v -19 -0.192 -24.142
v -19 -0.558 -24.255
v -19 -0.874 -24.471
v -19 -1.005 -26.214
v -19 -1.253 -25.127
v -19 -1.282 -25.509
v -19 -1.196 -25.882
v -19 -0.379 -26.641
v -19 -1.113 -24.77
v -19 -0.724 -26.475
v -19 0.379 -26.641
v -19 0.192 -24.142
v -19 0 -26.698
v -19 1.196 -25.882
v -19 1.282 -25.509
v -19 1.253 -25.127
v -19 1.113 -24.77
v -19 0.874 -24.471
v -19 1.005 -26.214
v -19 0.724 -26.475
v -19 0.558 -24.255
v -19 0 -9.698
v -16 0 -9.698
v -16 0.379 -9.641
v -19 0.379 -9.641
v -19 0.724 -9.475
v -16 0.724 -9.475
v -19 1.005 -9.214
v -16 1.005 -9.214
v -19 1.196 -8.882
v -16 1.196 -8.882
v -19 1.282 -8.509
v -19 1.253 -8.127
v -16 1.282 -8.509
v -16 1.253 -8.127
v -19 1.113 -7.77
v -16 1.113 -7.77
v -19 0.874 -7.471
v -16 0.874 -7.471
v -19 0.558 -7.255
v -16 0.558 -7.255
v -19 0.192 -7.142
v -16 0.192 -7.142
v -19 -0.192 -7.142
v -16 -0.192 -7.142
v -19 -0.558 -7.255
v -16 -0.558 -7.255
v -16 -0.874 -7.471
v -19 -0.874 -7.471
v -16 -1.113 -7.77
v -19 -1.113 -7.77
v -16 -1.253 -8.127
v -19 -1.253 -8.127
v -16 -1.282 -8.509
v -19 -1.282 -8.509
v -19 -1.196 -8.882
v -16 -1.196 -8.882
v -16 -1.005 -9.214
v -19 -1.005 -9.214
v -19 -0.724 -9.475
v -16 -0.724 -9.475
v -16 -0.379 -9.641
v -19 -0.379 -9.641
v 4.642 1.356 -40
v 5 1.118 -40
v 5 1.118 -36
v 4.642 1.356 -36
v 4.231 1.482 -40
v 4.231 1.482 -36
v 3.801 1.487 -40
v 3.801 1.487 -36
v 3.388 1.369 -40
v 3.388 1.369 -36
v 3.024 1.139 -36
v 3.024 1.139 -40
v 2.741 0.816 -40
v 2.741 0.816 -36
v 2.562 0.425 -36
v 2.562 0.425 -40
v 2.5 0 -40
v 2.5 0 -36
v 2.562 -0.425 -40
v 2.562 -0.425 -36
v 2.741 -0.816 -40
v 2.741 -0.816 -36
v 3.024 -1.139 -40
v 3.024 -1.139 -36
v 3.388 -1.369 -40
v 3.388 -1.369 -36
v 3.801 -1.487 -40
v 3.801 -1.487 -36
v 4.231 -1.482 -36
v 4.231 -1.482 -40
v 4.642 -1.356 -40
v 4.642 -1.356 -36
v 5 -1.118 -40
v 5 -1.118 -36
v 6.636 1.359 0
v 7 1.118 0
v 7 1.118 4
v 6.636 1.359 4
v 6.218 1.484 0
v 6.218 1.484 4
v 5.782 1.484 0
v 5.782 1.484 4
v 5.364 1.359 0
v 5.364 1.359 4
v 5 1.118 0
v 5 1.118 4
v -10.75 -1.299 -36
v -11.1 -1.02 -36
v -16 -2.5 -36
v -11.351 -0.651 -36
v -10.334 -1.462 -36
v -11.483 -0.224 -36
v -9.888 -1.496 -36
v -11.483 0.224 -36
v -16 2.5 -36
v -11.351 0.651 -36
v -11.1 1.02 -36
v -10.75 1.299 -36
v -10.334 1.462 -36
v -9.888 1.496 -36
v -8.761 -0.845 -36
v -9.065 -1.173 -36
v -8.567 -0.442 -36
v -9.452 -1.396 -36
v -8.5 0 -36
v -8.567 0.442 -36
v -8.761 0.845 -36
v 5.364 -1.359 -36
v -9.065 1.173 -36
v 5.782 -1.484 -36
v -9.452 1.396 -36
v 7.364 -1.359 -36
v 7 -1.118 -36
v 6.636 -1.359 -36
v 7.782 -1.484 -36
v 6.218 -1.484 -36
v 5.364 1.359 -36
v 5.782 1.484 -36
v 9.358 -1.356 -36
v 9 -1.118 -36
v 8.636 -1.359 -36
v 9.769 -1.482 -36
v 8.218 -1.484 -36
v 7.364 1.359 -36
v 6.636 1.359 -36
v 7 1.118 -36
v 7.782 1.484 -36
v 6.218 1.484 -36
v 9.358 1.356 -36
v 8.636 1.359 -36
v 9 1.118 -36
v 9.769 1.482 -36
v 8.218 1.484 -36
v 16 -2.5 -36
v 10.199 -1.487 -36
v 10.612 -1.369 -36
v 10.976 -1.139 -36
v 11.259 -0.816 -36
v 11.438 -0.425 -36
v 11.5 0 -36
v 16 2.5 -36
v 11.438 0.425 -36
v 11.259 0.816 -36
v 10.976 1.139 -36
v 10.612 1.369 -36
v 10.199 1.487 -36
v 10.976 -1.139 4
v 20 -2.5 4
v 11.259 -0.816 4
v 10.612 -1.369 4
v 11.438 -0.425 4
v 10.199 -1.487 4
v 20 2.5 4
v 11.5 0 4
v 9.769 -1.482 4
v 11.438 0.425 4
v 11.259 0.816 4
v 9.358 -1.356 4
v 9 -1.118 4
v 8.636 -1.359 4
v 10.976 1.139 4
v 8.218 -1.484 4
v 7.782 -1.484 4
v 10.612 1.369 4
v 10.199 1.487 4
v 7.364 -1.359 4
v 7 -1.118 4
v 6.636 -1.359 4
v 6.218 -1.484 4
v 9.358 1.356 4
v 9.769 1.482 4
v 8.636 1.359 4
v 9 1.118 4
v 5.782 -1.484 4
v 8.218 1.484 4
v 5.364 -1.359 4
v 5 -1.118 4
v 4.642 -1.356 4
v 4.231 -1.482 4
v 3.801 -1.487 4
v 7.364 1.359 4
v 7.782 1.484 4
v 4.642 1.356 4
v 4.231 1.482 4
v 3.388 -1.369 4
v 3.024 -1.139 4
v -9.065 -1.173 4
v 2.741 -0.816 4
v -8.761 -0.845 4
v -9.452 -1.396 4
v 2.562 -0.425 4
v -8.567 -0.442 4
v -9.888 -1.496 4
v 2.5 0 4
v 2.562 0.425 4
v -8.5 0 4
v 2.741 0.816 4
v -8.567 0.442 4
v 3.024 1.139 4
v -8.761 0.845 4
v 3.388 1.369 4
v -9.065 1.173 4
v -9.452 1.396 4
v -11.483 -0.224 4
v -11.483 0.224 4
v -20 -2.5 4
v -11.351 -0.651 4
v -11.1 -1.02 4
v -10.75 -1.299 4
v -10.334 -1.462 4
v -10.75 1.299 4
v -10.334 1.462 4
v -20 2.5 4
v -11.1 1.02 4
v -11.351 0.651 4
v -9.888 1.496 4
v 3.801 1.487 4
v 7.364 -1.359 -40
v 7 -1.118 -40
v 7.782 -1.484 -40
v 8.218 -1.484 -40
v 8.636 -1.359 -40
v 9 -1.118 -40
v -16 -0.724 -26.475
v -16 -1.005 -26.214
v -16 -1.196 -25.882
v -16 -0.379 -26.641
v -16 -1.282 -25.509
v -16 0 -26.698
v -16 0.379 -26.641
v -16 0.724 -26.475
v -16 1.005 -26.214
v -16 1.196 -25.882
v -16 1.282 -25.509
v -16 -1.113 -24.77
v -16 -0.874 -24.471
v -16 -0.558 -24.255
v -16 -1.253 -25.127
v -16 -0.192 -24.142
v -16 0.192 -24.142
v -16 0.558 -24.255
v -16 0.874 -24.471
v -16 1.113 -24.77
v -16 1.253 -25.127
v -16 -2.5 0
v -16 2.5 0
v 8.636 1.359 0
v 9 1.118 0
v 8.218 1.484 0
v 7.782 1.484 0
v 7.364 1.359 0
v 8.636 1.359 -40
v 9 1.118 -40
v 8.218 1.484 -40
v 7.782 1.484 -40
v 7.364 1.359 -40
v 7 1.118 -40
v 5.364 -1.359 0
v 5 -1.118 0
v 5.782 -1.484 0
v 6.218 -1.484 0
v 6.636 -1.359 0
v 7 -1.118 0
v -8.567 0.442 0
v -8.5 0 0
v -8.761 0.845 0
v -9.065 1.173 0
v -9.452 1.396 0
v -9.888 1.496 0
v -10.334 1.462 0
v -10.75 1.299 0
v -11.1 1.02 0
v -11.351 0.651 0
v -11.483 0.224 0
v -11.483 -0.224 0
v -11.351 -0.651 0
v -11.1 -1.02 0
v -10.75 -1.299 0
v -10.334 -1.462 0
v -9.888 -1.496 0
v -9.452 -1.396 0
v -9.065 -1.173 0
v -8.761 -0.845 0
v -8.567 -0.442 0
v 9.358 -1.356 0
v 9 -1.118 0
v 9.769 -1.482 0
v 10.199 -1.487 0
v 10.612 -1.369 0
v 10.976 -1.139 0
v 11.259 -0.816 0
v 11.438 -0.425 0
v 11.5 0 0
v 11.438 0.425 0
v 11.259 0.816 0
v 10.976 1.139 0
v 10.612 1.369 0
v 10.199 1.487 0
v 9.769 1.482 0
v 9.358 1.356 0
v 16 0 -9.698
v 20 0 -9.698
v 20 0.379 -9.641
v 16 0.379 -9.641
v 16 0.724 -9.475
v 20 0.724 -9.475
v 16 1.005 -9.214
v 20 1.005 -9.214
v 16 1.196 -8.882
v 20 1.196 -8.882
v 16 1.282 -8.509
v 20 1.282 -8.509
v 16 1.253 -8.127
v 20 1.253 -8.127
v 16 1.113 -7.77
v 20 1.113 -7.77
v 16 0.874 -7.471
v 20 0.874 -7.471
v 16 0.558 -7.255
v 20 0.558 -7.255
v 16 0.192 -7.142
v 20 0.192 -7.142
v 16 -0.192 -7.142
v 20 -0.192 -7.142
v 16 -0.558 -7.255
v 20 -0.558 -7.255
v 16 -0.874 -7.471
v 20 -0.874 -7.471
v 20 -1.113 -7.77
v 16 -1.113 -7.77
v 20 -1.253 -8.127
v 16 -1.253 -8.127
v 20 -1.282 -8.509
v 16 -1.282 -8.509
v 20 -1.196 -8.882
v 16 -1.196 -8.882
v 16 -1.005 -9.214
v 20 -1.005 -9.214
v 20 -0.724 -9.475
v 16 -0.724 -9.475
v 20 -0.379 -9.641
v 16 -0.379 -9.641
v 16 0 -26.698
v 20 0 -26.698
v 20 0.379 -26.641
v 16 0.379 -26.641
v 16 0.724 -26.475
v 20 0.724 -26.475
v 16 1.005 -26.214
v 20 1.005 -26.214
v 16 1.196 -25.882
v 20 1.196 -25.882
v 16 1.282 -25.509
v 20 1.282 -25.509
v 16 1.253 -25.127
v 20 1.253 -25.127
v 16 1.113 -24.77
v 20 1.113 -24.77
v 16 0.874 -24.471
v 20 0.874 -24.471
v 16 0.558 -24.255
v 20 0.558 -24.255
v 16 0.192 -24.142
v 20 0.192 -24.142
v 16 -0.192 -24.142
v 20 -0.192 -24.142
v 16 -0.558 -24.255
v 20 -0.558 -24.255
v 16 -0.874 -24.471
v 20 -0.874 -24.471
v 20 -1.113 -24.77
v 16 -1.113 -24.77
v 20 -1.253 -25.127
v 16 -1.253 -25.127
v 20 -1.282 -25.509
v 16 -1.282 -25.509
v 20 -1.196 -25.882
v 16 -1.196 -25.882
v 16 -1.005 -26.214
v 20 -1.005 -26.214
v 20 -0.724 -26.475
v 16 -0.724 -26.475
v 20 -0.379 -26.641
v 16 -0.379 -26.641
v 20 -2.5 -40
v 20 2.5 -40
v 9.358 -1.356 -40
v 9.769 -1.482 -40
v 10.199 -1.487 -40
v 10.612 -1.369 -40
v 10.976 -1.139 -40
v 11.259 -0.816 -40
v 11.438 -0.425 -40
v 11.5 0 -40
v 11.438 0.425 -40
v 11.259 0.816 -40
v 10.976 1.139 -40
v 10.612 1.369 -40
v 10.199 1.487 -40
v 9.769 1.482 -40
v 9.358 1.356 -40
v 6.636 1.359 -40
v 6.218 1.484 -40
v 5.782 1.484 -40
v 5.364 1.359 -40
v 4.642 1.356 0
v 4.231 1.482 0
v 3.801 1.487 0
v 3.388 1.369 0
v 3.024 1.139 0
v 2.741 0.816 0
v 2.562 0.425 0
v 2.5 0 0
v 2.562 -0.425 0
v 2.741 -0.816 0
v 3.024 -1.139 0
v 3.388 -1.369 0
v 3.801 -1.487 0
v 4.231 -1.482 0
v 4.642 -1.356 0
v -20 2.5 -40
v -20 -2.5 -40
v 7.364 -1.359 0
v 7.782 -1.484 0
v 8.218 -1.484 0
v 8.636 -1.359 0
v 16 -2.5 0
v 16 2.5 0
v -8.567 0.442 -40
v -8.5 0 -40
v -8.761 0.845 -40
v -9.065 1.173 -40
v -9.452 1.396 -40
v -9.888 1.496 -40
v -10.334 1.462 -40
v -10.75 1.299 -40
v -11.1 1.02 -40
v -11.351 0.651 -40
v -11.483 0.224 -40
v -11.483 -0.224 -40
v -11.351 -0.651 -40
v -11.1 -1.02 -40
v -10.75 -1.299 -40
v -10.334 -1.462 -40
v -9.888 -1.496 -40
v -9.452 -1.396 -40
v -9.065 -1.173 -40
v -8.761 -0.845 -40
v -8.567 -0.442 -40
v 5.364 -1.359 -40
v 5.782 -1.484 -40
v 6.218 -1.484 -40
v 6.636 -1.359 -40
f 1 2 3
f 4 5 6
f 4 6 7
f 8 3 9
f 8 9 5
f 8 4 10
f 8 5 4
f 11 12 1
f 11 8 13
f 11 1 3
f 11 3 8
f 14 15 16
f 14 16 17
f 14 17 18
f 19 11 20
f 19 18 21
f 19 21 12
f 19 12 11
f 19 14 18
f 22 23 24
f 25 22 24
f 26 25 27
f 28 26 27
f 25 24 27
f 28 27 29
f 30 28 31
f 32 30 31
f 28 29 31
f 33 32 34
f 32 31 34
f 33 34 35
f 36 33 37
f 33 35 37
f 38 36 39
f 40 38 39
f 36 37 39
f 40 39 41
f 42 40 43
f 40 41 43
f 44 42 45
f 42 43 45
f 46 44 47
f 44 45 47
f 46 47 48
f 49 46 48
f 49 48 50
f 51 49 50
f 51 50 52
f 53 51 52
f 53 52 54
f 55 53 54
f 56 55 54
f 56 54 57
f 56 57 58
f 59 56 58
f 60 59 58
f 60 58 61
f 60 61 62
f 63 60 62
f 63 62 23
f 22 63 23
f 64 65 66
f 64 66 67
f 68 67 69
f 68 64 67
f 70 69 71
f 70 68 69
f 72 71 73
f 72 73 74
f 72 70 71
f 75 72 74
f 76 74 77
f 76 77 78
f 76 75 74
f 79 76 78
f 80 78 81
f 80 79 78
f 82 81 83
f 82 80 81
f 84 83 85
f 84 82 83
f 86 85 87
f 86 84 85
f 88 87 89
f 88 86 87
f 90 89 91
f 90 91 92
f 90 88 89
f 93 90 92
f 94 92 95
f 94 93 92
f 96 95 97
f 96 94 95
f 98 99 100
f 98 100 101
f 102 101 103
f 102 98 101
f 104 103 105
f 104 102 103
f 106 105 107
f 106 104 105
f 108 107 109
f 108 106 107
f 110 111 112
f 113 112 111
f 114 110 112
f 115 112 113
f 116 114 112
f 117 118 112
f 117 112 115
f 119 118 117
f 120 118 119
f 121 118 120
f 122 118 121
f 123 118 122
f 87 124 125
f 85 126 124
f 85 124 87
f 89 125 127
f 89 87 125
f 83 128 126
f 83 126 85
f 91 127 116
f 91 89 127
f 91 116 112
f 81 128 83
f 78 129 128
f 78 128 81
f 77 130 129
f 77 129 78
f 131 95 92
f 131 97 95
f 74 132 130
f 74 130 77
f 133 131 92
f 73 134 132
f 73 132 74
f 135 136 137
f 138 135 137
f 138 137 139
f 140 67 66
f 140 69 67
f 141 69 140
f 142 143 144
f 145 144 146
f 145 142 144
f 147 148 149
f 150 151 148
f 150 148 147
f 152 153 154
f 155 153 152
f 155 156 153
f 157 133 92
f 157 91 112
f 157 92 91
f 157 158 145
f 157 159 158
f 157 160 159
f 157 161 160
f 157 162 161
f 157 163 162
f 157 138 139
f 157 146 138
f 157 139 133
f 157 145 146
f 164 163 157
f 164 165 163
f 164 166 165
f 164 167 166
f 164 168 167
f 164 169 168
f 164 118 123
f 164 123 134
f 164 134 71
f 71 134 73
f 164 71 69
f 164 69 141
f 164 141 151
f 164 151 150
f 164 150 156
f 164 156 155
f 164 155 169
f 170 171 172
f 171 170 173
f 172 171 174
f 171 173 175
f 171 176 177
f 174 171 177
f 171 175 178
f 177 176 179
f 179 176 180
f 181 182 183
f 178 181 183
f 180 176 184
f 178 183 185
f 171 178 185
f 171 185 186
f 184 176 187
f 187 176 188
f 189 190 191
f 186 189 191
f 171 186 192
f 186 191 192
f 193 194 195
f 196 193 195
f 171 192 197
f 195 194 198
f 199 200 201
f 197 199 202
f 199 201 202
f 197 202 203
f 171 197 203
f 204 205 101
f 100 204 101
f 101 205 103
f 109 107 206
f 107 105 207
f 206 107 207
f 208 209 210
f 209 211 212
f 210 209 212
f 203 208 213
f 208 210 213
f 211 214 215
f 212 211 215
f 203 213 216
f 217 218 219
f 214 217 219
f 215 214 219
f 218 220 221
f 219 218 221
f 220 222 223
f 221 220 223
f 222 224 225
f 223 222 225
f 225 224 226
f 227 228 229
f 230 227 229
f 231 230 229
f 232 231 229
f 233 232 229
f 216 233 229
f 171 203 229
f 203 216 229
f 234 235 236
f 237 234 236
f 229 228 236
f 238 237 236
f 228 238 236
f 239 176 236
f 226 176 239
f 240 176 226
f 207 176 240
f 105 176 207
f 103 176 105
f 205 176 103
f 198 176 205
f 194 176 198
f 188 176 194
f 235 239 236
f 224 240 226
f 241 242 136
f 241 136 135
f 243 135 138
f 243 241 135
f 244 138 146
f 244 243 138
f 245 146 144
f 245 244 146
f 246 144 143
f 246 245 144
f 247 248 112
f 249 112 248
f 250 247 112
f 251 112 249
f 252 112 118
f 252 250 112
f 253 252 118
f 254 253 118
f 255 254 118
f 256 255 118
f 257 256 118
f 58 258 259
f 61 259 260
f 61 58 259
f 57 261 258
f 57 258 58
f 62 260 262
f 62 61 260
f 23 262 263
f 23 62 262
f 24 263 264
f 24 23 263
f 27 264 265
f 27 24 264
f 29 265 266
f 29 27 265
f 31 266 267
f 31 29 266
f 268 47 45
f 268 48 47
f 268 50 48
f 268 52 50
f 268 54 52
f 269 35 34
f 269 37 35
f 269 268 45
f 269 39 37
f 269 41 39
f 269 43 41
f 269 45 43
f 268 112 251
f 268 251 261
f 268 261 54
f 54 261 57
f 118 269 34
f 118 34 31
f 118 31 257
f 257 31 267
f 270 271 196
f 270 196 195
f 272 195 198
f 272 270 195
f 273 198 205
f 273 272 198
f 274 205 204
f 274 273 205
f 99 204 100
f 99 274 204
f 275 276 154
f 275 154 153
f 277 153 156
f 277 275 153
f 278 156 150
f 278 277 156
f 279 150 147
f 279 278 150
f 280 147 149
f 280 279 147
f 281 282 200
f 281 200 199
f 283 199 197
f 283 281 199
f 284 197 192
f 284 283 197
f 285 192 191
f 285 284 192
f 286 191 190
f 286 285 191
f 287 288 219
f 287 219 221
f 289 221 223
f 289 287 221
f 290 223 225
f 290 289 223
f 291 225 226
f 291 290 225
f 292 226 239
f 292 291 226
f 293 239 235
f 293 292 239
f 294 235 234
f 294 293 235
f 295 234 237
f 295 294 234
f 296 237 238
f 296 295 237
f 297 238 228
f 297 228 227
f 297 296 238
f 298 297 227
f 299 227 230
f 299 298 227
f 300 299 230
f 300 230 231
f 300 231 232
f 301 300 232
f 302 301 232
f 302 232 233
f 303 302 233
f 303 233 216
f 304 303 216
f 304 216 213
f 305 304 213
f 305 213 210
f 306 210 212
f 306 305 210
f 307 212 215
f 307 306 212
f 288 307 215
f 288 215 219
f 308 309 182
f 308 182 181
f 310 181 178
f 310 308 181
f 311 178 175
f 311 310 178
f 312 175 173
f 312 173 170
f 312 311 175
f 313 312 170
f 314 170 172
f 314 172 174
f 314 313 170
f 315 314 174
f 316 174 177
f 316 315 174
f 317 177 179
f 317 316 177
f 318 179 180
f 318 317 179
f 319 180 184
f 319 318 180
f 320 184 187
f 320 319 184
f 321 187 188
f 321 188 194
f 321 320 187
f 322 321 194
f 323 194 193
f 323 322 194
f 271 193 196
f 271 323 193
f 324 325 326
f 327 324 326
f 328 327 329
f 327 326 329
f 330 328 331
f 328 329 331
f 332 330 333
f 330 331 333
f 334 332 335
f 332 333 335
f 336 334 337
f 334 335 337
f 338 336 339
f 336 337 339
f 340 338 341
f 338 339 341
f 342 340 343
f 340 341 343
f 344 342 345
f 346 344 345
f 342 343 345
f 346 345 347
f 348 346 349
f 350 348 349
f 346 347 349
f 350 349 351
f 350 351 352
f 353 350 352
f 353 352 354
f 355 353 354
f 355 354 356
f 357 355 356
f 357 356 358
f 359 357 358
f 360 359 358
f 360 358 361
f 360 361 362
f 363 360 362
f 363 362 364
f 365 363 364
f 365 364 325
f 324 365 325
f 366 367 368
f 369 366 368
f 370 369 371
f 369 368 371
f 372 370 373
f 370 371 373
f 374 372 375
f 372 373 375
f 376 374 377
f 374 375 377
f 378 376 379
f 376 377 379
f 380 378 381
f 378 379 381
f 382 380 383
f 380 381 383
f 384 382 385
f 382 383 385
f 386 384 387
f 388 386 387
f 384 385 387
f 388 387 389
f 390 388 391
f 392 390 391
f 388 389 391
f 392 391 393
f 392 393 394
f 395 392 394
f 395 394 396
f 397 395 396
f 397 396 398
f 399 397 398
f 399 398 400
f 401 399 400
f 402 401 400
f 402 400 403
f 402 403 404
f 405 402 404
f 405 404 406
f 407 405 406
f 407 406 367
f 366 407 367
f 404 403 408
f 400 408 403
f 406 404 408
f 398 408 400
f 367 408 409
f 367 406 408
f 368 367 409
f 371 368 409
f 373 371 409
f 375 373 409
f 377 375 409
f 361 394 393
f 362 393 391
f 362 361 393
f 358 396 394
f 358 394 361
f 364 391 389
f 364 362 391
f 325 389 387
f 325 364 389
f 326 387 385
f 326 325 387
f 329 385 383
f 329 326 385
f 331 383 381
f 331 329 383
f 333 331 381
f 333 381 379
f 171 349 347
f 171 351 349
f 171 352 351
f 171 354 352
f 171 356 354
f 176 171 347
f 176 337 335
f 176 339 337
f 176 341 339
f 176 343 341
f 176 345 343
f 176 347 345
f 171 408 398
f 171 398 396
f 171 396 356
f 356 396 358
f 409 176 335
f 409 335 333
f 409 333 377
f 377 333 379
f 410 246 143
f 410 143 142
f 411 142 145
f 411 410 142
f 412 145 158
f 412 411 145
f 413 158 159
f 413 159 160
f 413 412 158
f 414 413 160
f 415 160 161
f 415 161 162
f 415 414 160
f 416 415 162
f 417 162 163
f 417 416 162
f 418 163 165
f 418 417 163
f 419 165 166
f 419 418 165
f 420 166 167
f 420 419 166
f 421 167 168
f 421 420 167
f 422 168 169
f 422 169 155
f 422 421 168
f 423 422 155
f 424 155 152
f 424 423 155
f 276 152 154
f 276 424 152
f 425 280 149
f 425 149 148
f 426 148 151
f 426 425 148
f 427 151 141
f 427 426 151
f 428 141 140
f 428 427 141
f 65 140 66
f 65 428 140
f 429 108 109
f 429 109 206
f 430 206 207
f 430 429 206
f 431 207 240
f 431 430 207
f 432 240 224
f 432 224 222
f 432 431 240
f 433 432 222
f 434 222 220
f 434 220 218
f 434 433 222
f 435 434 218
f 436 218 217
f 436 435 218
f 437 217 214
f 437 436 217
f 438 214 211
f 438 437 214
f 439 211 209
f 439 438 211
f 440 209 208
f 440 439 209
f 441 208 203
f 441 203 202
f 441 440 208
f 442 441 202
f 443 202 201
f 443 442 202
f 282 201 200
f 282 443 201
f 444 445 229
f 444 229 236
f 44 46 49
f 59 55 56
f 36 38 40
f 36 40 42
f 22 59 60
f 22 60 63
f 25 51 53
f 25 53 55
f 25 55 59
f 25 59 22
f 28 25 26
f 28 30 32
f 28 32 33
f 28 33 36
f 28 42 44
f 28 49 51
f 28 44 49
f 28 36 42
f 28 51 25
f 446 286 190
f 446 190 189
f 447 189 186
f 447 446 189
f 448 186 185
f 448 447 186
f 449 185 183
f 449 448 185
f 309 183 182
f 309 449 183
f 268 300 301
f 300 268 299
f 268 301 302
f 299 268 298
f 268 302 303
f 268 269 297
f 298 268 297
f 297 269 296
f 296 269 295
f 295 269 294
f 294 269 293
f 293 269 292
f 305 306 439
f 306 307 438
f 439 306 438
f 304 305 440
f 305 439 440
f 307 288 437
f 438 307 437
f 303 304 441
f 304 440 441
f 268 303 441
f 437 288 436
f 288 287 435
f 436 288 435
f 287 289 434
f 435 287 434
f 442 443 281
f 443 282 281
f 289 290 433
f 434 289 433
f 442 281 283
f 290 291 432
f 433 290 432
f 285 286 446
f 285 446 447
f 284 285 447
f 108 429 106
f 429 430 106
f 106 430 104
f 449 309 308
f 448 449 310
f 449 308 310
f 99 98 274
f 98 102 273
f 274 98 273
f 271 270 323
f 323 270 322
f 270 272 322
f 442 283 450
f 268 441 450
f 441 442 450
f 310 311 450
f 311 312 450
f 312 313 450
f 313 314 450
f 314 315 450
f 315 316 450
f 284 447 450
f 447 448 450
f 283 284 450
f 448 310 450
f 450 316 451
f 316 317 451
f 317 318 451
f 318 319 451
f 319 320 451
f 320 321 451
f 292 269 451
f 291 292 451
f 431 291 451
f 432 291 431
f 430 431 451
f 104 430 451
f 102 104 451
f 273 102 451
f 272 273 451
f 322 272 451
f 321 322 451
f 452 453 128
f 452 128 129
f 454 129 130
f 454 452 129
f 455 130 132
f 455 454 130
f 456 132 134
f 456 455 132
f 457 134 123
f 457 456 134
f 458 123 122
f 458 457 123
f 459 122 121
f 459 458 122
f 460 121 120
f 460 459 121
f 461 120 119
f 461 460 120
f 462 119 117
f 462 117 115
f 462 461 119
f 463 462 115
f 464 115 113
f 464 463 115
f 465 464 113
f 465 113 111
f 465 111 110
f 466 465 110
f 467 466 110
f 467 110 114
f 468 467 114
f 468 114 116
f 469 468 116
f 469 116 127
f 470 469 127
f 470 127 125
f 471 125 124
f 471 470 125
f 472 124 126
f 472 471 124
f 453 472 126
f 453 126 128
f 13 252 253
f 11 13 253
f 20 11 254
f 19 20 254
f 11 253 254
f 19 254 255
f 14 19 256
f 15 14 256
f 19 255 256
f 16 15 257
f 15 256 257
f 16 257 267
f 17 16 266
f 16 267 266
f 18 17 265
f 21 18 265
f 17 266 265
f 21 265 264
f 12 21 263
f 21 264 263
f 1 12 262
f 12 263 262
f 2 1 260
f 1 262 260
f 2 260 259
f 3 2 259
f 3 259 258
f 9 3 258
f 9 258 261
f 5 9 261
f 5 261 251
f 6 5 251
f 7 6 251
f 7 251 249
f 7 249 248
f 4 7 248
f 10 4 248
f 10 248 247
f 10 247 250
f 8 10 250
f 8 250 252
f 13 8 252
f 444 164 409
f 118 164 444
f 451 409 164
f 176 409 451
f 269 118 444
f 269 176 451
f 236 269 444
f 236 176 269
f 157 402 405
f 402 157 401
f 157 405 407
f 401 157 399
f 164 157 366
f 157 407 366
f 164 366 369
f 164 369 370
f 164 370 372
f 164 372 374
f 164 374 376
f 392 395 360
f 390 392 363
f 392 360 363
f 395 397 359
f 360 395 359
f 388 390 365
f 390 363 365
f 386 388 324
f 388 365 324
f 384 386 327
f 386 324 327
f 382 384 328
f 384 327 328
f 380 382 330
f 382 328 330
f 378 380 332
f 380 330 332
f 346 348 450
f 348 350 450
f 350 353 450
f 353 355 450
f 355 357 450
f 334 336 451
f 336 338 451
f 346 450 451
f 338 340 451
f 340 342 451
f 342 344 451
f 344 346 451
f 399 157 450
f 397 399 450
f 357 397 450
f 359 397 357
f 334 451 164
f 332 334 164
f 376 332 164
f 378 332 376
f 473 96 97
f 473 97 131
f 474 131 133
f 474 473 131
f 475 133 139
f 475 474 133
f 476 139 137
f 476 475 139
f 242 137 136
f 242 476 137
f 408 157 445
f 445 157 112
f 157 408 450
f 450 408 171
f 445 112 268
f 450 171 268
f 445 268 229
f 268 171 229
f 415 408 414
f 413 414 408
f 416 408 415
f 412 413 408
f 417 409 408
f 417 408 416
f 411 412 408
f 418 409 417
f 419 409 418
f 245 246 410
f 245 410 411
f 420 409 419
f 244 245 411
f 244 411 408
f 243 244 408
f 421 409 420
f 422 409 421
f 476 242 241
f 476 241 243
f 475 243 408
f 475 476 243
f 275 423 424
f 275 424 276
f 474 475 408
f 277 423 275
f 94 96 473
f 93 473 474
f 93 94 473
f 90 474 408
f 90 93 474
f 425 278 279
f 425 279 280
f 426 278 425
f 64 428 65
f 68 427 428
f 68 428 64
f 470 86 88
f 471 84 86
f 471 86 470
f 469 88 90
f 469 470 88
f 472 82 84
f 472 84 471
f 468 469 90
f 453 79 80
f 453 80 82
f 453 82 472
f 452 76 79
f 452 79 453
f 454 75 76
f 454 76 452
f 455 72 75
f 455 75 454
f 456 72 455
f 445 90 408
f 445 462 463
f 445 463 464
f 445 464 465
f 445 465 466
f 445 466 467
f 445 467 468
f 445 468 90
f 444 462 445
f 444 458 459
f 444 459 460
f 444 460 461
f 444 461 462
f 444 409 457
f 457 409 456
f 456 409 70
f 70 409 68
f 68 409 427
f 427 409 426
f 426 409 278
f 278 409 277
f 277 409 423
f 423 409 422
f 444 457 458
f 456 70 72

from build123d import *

# Parameters (mm, degrees)
ESBO_O1_W                = 32
ESBO_O1_H                = 5
ESBO_O1_R                = 1.5
RESSALTO_EXTRUS_O1_DEPTH = 4
ESBO_O3_W                = 4
ESBO_O3_H                = 5
RESSALTO_EXTRUS_O2_DEPTH = 44
PADR_O_LINEAR1_COUNT     = 2
PADR_O_LINEAR1_PITCH     = 40
ESBO_O4_R                = 1.285304246
CORTE_EXTRUS_O1_DEPTH    = 39


with BuildPart() as part:
    # Esboço1 → Ressalto-extrusão1 (new body)
    with BuildSketch(Plane.XY):
        Rectangle(ESBO_O1_W, ESBO_O1_H)
        with Locations((-10, 0)):
            Circle(ESBO_O1_R, mode=Mode.SUBTRACT)
        with BuildLine():
            ThreePointArc((5, 1.118033989), (2.5, 0), (5, -1.118033989))
            ThreePointArc((5, -1.118033989), (6, -1.5), (7, -1.118033989))
            ThreePointArc((7, -1.118033989), (8, -1.5), (9, -1.118033989))
            ThreePointArc((9, -1.118033989), (11.5, 0), (9, 1.118033989))
            ThreePointArc((9, 1.118033989), (8, 1.5), (7, 1.118033989))
            ThreePointArc((7, 1.118033989), (6, 1.5), (5, 1.118033989))
        make_face(mode=Mode.SUBTRACT)
    ressalto_extrus_o1 = extrude(amount=RESSALTO_EXTRUS_O1_DEPTH)

    # Esboço3 → Ressalto-extrusão2 (add)
    with BuildSketch(Plane.XY.offset(4)):
        with Locations((18, 0)):
            Rectangle(ESBO_O3_W, ESBO_O3_H)
    ressalto_extrus_o2 = extrude(amount=-RESSALTO_EXTRUS_O2_DEPTH)

    # Padrão linear1: Ressalto-extrusão1 ×2
    with Locations(*[(0, 0, -i * PADR_O_LINEAR1_PITCH) for i in range(1, PADR_O_LINEAR1_COUNT)]):
        add(ressalto_extrus_o1)

    # Espelhar1: Ressalto-extrusão2 across plane
    add(ressalto_extrus_o2.mirror(Plane(origin=(0, 0, 0), x_dir=(0, 0, 1), z_dir=(1, 0, 0))))

    # Esboço4 → Corte-extrusão1 (cut)
    with BuildSketch(Plane(origin=(20, 0, 0), x_dir=(0, 0, -1), z_dir=(1, 0, 0))):
        with Locations((8.412908062, 0)):
            Circle(ESBO_O4_R)
        with Locations((25.412908062, 0)):
            Circle(ESBO_O4_R)
    extrude(amount=-CORTE_EXTRUS_O1_DEPTH, mode=Mode.SUBTRACT)


solid = part.part
